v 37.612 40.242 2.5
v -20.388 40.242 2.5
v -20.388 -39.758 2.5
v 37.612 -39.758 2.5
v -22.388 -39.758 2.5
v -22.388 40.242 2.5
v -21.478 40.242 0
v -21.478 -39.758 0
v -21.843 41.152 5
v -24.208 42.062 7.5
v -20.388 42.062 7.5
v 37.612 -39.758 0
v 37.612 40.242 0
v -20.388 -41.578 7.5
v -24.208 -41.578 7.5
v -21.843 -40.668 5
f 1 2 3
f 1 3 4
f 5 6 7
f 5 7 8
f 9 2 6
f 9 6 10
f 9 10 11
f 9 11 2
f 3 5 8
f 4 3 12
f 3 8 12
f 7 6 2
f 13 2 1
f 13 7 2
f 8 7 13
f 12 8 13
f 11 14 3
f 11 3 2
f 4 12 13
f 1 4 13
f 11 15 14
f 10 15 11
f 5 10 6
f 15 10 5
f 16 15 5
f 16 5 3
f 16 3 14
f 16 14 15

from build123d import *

# Parameters (mm, degrees)
F0_W     = 60
F0_H     = 80
F1_DEPTH = 2.5
F2_W     = 4
F2_H     = 80
F3_DEPTH = 5
F3_TAPER = -20
F4_W     = 3.8198511713
F4_H     = 83.6397023427
F5_DEPTH = 5
F6_W     = 82.729776757
F6_H     = 28.9270184836
F7_DEPTH = 25


with BuildPart() as f1:
    # F0 (on Top) → F1 (new body)
    with BuildSketch(Plane.XY):
        with Locations((7.6121210307, 0.2416865528)):
            Rectangle(F0_W, F0_H)
    extrude(amount=F1_DEPTH)

    # F2 (on face) → F3 (join)
    with BuildSketch(Plane.XY.offset(2.5)):
        with Locations((-20.3878789693, 0.2416865528)):
            Rectangle(F2_W, F2_H)
    extrude(amount=F3_DEPTH, taper=F3_TAPER)

    # F4 (on face) → F5 (cut)
    with BuildSketch(Plane.XY.offset(7.5)):
        with Locations((-18.4779533836, 0.2416865528)):
            Rectangle(F4_W, F4_H)
    extrude(amount=-F5_DEPTH, mode=Mode.SUBTRACT)

    # F6 (on face) → F7 (cut)
    with BuildSketch(Plane(origin=(-18.9655101114, 0, -6.9028811582), x_dir=(0, -1, 0), z_dir=(-0.9396926208, 0, -0.3420201433))):
        with Locations((-0.6966493456, 0.8637167464)):
            Rectangle(F6_W, F6_H)
    extrude(amount=F7_DEPTH, mode=Mode.SUBTRACT)


solid = f1.part
